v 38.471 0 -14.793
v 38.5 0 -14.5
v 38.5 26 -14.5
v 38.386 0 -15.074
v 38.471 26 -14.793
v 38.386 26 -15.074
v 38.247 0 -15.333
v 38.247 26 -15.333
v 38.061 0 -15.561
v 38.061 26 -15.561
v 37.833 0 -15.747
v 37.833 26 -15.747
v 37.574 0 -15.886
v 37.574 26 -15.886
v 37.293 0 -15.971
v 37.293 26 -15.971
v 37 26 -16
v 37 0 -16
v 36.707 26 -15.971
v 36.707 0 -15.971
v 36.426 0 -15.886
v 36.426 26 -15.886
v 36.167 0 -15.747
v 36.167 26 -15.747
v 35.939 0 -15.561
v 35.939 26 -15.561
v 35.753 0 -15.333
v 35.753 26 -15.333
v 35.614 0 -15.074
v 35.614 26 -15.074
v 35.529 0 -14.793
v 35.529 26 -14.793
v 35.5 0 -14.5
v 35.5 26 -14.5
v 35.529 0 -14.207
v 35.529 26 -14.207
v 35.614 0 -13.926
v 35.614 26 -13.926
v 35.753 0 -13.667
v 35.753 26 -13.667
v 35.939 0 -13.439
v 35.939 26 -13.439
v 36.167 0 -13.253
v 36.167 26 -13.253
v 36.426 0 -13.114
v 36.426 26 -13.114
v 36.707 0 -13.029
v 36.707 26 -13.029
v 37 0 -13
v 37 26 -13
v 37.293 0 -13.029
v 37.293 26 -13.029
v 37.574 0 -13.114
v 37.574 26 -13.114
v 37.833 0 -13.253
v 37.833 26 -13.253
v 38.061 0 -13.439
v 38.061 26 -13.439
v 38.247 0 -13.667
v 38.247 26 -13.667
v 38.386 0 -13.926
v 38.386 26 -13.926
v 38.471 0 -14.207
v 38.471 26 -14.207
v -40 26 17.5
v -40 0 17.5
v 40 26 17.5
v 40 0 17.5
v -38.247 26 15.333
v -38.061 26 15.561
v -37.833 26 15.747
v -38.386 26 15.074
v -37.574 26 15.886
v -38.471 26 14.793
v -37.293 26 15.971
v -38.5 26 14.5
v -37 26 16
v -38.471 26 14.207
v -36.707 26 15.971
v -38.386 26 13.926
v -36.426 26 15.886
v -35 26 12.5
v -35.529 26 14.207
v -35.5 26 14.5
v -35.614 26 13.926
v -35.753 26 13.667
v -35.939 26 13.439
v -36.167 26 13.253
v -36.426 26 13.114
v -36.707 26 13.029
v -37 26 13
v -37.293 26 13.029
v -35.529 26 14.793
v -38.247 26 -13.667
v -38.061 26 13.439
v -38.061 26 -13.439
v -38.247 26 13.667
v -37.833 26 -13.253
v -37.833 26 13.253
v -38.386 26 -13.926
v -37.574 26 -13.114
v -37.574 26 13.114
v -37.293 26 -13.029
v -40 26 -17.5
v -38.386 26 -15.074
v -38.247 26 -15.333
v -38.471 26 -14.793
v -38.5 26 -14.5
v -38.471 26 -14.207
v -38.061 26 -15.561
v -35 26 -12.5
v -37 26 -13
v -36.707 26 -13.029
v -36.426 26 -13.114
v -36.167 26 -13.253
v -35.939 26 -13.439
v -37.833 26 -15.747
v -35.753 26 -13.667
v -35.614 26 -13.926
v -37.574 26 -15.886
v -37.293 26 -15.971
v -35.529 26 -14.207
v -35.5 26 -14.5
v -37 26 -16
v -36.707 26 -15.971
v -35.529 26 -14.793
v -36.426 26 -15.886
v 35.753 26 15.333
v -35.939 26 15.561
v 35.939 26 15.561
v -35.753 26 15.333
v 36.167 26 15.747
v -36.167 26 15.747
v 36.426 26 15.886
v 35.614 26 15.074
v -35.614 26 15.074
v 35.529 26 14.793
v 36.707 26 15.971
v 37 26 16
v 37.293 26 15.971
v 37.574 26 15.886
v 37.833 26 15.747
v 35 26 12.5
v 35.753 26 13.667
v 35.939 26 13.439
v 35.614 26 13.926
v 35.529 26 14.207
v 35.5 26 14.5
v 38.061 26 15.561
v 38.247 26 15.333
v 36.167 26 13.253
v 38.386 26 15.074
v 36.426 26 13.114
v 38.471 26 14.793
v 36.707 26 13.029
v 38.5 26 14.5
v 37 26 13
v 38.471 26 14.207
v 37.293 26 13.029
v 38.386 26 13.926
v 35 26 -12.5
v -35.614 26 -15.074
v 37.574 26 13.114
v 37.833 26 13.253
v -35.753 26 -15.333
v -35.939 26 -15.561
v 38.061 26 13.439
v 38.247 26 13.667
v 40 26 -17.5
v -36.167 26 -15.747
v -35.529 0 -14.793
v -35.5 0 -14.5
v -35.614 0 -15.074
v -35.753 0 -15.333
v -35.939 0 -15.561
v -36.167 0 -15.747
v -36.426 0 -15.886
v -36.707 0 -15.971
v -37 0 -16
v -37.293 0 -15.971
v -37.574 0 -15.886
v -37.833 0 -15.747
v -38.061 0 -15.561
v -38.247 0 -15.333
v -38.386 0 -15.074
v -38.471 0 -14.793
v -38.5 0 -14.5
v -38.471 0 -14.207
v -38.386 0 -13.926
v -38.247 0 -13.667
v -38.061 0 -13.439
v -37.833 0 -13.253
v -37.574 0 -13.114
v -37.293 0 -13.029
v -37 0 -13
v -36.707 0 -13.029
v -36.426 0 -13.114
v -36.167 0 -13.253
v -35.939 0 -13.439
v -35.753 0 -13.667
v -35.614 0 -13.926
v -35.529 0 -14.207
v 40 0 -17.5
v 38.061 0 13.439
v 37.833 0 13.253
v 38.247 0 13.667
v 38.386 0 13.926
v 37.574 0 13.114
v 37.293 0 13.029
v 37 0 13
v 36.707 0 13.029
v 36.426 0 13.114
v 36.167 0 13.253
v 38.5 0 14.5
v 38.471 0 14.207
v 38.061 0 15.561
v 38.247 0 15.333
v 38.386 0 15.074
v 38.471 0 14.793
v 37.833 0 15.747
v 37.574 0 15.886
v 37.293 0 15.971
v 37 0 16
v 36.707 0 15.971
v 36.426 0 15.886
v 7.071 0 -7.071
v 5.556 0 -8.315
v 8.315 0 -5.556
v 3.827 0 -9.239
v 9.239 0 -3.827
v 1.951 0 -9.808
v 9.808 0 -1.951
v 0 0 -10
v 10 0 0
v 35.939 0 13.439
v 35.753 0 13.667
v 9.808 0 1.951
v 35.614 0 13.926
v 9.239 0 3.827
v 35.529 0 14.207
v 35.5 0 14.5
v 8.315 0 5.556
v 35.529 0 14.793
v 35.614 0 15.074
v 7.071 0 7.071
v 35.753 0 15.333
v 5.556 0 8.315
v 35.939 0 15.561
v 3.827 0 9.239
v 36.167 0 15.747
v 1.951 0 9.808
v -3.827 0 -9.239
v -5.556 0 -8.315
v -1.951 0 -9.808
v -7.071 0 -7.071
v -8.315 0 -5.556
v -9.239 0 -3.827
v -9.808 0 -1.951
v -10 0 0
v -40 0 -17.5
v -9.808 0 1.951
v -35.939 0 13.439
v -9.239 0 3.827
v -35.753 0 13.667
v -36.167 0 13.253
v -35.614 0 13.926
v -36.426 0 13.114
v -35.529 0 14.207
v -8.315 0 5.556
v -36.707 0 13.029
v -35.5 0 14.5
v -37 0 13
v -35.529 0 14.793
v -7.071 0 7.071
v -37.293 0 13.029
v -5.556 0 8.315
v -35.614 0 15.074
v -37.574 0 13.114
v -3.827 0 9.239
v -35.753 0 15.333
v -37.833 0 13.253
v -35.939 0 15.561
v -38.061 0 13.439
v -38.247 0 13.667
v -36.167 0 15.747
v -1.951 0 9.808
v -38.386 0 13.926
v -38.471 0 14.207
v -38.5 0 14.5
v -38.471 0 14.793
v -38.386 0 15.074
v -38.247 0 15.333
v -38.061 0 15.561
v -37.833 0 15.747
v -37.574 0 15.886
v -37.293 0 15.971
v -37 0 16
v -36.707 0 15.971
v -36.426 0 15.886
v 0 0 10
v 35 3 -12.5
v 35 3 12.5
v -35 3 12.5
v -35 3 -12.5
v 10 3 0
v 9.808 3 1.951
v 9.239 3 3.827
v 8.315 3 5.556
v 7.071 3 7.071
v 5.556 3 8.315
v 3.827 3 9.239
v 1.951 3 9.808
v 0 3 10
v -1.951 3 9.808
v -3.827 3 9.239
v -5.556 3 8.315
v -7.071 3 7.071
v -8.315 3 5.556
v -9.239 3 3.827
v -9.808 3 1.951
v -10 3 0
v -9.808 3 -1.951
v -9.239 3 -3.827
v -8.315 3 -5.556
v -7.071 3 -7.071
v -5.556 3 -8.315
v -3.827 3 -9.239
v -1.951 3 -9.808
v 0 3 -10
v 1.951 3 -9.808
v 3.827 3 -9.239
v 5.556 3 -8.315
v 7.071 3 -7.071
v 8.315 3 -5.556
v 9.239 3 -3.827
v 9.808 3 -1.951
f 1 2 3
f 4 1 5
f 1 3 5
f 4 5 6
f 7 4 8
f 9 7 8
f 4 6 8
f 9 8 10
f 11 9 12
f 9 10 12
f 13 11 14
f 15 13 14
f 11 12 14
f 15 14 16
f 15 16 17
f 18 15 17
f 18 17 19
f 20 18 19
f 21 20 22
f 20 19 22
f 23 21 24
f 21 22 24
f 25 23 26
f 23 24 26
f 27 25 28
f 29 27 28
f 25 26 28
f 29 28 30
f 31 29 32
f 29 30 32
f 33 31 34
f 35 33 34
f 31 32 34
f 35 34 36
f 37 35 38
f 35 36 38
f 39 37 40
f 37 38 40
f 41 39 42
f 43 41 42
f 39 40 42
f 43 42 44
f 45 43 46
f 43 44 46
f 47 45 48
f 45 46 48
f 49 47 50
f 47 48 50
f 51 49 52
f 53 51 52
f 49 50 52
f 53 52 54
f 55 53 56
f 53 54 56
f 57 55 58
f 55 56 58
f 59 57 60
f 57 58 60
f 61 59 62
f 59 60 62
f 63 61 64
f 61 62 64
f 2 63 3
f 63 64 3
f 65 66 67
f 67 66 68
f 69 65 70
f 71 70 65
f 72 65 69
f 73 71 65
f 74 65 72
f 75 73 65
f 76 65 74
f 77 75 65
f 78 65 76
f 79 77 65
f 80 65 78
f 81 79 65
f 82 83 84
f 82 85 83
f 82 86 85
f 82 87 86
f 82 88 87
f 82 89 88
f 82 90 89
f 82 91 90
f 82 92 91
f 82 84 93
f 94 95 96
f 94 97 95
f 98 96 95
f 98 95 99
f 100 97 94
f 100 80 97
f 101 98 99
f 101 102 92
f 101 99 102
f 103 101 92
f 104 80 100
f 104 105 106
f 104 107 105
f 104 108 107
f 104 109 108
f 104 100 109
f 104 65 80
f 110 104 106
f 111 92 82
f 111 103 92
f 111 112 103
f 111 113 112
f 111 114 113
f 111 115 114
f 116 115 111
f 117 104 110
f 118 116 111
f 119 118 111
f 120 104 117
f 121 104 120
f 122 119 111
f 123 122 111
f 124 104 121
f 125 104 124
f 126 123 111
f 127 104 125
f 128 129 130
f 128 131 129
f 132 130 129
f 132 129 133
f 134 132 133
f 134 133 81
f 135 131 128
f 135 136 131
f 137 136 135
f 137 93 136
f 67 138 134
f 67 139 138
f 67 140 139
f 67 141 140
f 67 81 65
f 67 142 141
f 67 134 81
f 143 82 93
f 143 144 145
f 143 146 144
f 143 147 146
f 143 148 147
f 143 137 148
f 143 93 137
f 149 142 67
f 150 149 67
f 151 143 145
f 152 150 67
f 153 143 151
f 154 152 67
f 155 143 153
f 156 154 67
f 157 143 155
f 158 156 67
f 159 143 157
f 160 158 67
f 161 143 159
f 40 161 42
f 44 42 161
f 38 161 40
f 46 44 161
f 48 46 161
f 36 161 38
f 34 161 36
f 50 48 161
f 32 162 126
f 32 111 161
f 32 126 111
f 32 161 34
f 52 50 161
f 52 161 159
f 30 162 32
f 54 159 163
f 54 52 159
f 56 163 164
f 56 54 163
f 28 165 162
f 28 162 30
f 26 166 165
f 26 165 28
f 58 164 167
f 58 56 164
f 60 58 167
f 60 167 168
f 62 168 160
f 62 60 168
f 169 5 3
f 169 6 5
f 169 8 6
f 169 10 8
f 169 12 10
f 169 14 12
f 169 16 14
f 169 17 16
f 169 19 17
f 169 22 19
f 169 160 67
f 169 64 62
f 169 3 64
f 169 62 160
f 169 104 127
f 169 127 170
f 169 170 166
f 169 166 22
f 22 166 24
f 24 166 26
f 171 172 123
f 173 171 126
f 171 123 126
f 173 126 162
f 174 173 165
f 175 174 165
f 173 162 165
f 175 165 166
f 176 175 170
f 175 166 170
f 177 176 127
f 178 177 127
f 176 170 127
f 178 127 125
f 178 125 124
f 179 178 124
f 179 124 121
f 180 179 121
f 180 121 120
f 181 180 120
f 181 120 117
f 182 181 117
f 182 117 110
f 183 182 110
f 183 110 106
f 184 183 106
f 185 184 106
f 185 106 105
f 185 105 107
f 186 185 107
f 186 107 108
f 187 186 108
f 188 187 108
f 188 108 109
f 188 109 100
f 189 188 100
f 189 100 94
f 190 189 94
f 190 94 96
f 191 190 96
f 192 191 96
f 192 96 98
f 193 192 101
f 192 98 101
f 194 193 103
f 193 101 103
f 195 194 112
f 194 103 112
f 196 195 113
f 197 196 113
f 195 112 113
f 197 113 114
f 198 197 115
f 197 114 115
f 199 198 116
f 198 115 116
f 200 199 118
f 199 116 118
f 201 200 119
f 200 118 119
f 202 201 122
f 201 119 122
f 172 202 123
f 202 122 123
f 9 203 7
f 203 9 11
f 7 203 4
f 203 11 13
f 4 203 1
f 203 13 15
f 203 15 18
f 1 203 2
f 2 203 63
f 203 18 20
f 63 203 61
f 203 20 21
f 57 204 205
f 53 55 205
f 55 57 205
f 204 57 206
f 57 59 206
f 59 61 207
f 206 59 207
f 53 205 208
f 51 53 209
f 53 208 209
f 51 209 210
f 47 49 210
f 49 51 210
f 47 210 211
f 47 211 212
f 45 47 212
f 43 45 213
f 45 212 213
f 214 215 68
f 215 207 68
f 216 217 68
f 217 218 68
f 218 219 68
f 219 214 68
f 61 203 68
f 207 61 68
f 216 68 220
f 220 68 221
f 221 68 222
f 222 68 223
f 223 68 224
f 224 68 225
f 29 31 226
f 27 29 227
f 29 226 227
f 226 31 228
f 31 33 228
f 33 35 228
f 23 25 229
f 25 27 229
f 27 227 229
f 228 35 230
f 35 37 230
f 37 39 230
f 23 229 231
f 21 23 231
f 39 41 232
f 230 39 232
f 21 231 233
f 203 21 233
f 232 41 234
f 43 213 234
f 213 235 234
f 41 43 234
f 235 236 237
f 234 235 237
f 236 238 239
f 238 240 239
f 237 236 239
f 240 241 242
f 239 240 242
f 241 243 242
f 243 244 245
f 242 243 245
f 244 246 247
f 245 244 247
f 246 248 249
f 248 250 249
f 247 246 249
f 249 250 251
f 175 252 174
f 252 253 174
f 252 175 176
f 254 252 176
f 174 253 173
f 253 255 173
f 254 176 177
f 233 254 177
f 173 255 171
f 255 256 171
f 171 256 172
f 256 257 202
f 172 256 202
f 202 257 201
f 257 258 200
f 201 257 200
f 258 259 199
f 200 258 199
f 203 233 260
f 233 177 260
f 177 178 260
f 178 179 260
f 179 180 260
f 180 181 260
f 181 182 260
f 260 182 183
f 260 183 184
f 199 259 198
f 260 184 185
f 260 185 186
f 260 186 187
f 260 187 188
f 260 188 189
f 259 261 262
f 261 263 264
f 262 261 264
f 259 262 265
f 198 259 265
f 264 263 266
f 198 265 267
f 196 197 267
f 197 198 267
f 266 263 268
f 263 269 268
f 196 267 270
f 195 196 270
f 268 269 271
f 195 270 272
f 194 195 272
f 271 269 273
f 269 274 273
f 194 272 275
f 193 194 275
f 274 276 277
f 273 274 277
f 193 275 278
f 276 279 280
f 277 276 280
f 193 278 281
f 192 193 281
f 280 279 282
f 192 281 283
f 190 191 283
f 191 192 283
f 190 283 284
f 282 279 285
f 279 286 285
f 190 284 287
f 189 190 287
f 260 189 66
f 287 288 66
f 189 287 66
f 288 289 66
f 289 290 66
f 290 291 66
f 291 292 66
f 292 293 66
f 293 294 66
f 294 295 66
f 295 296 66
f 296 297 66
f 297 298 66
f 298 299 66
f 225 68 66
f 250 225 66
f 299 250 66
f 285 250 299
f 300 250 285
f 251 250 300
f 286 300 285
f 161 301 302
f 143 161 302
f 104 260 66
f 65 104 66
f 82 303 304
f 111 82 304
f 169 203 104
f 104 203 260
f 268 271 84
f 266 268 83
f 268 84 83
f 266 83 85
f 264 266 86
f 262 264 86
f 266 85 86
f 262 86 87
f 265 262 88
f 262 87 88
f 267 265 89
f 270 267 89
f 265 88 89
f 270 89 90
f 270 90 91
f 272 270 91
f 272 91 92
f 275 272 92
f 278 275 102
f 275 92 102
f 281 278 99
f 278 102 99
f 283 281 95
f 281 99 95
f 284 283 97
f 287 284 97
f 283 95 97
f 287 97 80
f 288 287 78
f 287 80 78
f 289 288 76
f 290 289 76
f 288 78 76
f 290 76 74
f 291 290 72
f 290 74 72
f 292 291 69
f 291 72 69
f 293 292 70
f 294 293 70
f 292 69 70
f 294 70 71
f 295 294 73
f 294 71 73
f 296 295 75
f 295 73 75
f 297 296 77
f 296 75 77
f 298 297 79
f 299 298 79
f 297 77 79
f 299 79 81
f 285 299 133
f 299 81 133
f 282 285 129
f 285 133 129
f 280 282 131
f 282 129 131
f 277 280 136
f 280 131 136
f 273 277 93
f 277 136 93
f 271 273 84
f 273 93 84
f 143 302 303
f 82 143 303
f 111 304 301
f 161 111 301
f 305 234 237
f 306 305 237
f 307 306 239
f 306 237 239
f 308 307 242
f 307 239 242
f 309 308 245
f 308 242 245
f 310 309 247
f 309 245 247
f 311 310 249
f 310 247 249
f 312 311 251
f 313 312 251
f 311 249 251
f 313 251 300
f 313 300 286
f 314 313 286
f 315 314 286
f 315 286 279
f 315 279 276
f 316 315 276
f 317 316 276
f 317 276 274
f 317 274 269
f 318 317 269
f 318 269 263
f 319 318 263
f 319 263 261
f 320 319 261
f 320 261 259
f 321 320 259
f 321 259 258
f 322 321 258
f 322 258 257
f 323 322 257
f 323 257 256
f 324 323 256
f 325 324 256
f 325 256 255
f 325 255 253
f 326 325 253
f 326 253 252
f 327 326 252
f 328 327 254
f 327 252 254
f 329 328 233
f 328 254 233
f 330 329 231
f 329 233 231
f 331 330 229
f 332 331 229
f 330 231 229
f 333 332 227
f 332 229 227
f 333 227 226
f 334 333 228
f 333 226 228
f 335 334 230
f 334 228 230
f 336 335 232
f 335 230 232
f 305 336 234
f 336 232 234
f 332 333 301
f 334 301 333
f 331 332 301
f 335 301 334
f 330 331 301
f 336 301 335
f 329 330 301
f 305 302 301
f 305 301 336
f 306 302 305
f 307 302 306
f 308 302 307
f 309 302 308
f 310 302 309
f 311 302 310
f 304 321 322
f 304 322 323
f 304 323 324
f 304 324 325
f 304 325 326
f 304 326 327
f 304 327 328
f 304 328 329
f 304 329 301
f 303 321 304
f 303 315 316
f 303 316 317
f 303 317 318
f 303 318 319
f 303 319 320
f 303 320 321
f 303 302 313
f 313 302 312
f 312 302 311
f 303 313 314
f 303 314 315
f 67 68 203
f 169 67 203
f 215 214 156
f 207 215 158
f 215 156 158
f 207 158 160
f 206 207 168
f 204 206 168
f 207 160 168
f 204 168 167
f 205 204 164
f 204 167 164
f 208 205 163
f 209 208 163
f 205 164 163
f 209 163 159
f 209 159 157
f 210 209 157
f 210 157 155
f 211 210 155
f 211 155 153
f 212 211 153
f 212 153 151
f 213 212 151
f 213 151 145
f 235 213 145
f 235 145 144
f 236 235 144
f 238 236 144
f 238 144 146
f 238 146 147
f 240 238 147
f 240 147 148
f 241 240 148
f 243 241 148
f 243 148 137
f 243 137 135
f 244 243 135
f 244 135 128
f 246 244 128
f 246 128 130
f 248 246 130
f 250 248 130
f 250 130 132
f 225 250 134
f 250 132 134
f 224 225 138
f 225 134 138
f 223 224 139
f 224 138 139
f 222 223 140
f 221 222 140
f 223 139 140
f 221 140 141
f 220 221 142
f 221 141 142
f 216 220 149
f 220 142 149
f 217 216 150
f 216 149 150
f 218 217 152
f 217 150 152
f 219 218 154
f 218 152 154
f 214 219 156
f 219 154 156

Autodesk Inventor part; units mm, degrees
ref_plane "YZ Plane" through (0, 0, 0) normal (1, 0, 0) x (0, 1, 0)
ref_plane "XZ Plane" through (0, 0, 0) normal (0, 1, 0) x (-1, 0, 0)
ref_plane "XY Plane" through (0, 0, 0) normal (0, 0, 1) x (1, 0, 0)
sketch "Sketch1" plane through (0, 0, 0) normal (0, 1, 0) x (-1, 0, 0)
  line L0 (40, 17.5) -> (-40, 17.5)
  line L1 (-40, 17.5) -> (-40, -17.5)
  line L2 (-40, -17.5) -> (40, -17.5)
  line L3 (40, -17.5) -> (40, 17.5)
  line L4 (40, 17.5) -> (-40, -17.5) construction
  line L5 (-40, 17.5) -> (40, -17.5) construction
  point P0 (0, 0)
  dimension "d0" = 80
  dimension "d1" = 35
extrude "Extrusion1" add sketch "Sketch1" along normal blind 3
sketch "Sketch2" plane through (0, 3, 0) normal (0, 1, 0) x (1, 0, 0)
  line L0 (35, -12.5) -> (-35, -12.5)
  line L1 (-35, -12.5) -> (-35, 12.5)
  line L2 (-35, 12.5) -> (35, 12.5)
  line L3 (35, 12.5) -> (35, -12.5)
  line L4 (35, -12.5) -> (-35, 12.5) construction
  line L5 (-35, -12.5) -> (35, 12.5) construction
  line L6 (40, 17.5) -> (-40, 17.5) projected
  line L7 (40, -17.5) -> (40, 17.5) projected
  line L8 (40, -17.5) -> (40, 17.5) projected
  line L9 (40, 17.5) -> (-40, 17.5) projected
  line L10 (-40, 17.5) -> (-40, -17.5) projected
  line L11 (-40, -17.5) -> (40, -17.5) projected
  point P0 (0, 0)
  dimension "d4" = 70
  dimension "d5" = 25
extrude "Extrusion2" add sketch "Sketch2" along normal blind 23
sketch "Sketch3" plane through (0, 26, 0) normal (0, 1, 0) x (1, 0, 0)
  circle A0 centre (-37, -14.5) radius 1.5
  line L0 (-40, 17.5) -> (-40, -17.5) projected
  line L1 (-40, -17.5) -> (40, -17.5) projected
  circle A1 centre (-37, 14.5) radius 1.5
  circle A2 centre (37, 14.5) radius 1.5
  circle A3 centre (37, -14.5) radius 1.5
  line L2 (40, 17.5) -> (-40, 17.5) projected
  line L3 (40, -17.5) -> (40, 17.5) projected
  point P0 (0, 0)
  dimension "d11" = 3
  dimension "d12" = 3
  dimension "d13" = 3
  dimension "d14" = 3
  dimension "d15" = 3
  dimension "d16" = 3
  dimension "d17" = 3
  dimension "d18" = 3
  dimension "d19" = 3
  dimension "d20" = 3
  dimension "d21" = 3
  dimension "d22" = 3
extrude "Extrusion3" cut sketch "Sketch3" against normal through all contours A0 | A1 | A2 | A3
sketch "Sketch4" plane through (0, 0, 0) normal (0, -1, 0) x (1, 0, 0)
  circle A0 centre (0, 0) radius 10
  dimension "d25" = 20
extrude "Extrusion4" cut sketch "Sketch4" against normal blind 10
properties part number "camera_case_2" material "ABS Plastic"
